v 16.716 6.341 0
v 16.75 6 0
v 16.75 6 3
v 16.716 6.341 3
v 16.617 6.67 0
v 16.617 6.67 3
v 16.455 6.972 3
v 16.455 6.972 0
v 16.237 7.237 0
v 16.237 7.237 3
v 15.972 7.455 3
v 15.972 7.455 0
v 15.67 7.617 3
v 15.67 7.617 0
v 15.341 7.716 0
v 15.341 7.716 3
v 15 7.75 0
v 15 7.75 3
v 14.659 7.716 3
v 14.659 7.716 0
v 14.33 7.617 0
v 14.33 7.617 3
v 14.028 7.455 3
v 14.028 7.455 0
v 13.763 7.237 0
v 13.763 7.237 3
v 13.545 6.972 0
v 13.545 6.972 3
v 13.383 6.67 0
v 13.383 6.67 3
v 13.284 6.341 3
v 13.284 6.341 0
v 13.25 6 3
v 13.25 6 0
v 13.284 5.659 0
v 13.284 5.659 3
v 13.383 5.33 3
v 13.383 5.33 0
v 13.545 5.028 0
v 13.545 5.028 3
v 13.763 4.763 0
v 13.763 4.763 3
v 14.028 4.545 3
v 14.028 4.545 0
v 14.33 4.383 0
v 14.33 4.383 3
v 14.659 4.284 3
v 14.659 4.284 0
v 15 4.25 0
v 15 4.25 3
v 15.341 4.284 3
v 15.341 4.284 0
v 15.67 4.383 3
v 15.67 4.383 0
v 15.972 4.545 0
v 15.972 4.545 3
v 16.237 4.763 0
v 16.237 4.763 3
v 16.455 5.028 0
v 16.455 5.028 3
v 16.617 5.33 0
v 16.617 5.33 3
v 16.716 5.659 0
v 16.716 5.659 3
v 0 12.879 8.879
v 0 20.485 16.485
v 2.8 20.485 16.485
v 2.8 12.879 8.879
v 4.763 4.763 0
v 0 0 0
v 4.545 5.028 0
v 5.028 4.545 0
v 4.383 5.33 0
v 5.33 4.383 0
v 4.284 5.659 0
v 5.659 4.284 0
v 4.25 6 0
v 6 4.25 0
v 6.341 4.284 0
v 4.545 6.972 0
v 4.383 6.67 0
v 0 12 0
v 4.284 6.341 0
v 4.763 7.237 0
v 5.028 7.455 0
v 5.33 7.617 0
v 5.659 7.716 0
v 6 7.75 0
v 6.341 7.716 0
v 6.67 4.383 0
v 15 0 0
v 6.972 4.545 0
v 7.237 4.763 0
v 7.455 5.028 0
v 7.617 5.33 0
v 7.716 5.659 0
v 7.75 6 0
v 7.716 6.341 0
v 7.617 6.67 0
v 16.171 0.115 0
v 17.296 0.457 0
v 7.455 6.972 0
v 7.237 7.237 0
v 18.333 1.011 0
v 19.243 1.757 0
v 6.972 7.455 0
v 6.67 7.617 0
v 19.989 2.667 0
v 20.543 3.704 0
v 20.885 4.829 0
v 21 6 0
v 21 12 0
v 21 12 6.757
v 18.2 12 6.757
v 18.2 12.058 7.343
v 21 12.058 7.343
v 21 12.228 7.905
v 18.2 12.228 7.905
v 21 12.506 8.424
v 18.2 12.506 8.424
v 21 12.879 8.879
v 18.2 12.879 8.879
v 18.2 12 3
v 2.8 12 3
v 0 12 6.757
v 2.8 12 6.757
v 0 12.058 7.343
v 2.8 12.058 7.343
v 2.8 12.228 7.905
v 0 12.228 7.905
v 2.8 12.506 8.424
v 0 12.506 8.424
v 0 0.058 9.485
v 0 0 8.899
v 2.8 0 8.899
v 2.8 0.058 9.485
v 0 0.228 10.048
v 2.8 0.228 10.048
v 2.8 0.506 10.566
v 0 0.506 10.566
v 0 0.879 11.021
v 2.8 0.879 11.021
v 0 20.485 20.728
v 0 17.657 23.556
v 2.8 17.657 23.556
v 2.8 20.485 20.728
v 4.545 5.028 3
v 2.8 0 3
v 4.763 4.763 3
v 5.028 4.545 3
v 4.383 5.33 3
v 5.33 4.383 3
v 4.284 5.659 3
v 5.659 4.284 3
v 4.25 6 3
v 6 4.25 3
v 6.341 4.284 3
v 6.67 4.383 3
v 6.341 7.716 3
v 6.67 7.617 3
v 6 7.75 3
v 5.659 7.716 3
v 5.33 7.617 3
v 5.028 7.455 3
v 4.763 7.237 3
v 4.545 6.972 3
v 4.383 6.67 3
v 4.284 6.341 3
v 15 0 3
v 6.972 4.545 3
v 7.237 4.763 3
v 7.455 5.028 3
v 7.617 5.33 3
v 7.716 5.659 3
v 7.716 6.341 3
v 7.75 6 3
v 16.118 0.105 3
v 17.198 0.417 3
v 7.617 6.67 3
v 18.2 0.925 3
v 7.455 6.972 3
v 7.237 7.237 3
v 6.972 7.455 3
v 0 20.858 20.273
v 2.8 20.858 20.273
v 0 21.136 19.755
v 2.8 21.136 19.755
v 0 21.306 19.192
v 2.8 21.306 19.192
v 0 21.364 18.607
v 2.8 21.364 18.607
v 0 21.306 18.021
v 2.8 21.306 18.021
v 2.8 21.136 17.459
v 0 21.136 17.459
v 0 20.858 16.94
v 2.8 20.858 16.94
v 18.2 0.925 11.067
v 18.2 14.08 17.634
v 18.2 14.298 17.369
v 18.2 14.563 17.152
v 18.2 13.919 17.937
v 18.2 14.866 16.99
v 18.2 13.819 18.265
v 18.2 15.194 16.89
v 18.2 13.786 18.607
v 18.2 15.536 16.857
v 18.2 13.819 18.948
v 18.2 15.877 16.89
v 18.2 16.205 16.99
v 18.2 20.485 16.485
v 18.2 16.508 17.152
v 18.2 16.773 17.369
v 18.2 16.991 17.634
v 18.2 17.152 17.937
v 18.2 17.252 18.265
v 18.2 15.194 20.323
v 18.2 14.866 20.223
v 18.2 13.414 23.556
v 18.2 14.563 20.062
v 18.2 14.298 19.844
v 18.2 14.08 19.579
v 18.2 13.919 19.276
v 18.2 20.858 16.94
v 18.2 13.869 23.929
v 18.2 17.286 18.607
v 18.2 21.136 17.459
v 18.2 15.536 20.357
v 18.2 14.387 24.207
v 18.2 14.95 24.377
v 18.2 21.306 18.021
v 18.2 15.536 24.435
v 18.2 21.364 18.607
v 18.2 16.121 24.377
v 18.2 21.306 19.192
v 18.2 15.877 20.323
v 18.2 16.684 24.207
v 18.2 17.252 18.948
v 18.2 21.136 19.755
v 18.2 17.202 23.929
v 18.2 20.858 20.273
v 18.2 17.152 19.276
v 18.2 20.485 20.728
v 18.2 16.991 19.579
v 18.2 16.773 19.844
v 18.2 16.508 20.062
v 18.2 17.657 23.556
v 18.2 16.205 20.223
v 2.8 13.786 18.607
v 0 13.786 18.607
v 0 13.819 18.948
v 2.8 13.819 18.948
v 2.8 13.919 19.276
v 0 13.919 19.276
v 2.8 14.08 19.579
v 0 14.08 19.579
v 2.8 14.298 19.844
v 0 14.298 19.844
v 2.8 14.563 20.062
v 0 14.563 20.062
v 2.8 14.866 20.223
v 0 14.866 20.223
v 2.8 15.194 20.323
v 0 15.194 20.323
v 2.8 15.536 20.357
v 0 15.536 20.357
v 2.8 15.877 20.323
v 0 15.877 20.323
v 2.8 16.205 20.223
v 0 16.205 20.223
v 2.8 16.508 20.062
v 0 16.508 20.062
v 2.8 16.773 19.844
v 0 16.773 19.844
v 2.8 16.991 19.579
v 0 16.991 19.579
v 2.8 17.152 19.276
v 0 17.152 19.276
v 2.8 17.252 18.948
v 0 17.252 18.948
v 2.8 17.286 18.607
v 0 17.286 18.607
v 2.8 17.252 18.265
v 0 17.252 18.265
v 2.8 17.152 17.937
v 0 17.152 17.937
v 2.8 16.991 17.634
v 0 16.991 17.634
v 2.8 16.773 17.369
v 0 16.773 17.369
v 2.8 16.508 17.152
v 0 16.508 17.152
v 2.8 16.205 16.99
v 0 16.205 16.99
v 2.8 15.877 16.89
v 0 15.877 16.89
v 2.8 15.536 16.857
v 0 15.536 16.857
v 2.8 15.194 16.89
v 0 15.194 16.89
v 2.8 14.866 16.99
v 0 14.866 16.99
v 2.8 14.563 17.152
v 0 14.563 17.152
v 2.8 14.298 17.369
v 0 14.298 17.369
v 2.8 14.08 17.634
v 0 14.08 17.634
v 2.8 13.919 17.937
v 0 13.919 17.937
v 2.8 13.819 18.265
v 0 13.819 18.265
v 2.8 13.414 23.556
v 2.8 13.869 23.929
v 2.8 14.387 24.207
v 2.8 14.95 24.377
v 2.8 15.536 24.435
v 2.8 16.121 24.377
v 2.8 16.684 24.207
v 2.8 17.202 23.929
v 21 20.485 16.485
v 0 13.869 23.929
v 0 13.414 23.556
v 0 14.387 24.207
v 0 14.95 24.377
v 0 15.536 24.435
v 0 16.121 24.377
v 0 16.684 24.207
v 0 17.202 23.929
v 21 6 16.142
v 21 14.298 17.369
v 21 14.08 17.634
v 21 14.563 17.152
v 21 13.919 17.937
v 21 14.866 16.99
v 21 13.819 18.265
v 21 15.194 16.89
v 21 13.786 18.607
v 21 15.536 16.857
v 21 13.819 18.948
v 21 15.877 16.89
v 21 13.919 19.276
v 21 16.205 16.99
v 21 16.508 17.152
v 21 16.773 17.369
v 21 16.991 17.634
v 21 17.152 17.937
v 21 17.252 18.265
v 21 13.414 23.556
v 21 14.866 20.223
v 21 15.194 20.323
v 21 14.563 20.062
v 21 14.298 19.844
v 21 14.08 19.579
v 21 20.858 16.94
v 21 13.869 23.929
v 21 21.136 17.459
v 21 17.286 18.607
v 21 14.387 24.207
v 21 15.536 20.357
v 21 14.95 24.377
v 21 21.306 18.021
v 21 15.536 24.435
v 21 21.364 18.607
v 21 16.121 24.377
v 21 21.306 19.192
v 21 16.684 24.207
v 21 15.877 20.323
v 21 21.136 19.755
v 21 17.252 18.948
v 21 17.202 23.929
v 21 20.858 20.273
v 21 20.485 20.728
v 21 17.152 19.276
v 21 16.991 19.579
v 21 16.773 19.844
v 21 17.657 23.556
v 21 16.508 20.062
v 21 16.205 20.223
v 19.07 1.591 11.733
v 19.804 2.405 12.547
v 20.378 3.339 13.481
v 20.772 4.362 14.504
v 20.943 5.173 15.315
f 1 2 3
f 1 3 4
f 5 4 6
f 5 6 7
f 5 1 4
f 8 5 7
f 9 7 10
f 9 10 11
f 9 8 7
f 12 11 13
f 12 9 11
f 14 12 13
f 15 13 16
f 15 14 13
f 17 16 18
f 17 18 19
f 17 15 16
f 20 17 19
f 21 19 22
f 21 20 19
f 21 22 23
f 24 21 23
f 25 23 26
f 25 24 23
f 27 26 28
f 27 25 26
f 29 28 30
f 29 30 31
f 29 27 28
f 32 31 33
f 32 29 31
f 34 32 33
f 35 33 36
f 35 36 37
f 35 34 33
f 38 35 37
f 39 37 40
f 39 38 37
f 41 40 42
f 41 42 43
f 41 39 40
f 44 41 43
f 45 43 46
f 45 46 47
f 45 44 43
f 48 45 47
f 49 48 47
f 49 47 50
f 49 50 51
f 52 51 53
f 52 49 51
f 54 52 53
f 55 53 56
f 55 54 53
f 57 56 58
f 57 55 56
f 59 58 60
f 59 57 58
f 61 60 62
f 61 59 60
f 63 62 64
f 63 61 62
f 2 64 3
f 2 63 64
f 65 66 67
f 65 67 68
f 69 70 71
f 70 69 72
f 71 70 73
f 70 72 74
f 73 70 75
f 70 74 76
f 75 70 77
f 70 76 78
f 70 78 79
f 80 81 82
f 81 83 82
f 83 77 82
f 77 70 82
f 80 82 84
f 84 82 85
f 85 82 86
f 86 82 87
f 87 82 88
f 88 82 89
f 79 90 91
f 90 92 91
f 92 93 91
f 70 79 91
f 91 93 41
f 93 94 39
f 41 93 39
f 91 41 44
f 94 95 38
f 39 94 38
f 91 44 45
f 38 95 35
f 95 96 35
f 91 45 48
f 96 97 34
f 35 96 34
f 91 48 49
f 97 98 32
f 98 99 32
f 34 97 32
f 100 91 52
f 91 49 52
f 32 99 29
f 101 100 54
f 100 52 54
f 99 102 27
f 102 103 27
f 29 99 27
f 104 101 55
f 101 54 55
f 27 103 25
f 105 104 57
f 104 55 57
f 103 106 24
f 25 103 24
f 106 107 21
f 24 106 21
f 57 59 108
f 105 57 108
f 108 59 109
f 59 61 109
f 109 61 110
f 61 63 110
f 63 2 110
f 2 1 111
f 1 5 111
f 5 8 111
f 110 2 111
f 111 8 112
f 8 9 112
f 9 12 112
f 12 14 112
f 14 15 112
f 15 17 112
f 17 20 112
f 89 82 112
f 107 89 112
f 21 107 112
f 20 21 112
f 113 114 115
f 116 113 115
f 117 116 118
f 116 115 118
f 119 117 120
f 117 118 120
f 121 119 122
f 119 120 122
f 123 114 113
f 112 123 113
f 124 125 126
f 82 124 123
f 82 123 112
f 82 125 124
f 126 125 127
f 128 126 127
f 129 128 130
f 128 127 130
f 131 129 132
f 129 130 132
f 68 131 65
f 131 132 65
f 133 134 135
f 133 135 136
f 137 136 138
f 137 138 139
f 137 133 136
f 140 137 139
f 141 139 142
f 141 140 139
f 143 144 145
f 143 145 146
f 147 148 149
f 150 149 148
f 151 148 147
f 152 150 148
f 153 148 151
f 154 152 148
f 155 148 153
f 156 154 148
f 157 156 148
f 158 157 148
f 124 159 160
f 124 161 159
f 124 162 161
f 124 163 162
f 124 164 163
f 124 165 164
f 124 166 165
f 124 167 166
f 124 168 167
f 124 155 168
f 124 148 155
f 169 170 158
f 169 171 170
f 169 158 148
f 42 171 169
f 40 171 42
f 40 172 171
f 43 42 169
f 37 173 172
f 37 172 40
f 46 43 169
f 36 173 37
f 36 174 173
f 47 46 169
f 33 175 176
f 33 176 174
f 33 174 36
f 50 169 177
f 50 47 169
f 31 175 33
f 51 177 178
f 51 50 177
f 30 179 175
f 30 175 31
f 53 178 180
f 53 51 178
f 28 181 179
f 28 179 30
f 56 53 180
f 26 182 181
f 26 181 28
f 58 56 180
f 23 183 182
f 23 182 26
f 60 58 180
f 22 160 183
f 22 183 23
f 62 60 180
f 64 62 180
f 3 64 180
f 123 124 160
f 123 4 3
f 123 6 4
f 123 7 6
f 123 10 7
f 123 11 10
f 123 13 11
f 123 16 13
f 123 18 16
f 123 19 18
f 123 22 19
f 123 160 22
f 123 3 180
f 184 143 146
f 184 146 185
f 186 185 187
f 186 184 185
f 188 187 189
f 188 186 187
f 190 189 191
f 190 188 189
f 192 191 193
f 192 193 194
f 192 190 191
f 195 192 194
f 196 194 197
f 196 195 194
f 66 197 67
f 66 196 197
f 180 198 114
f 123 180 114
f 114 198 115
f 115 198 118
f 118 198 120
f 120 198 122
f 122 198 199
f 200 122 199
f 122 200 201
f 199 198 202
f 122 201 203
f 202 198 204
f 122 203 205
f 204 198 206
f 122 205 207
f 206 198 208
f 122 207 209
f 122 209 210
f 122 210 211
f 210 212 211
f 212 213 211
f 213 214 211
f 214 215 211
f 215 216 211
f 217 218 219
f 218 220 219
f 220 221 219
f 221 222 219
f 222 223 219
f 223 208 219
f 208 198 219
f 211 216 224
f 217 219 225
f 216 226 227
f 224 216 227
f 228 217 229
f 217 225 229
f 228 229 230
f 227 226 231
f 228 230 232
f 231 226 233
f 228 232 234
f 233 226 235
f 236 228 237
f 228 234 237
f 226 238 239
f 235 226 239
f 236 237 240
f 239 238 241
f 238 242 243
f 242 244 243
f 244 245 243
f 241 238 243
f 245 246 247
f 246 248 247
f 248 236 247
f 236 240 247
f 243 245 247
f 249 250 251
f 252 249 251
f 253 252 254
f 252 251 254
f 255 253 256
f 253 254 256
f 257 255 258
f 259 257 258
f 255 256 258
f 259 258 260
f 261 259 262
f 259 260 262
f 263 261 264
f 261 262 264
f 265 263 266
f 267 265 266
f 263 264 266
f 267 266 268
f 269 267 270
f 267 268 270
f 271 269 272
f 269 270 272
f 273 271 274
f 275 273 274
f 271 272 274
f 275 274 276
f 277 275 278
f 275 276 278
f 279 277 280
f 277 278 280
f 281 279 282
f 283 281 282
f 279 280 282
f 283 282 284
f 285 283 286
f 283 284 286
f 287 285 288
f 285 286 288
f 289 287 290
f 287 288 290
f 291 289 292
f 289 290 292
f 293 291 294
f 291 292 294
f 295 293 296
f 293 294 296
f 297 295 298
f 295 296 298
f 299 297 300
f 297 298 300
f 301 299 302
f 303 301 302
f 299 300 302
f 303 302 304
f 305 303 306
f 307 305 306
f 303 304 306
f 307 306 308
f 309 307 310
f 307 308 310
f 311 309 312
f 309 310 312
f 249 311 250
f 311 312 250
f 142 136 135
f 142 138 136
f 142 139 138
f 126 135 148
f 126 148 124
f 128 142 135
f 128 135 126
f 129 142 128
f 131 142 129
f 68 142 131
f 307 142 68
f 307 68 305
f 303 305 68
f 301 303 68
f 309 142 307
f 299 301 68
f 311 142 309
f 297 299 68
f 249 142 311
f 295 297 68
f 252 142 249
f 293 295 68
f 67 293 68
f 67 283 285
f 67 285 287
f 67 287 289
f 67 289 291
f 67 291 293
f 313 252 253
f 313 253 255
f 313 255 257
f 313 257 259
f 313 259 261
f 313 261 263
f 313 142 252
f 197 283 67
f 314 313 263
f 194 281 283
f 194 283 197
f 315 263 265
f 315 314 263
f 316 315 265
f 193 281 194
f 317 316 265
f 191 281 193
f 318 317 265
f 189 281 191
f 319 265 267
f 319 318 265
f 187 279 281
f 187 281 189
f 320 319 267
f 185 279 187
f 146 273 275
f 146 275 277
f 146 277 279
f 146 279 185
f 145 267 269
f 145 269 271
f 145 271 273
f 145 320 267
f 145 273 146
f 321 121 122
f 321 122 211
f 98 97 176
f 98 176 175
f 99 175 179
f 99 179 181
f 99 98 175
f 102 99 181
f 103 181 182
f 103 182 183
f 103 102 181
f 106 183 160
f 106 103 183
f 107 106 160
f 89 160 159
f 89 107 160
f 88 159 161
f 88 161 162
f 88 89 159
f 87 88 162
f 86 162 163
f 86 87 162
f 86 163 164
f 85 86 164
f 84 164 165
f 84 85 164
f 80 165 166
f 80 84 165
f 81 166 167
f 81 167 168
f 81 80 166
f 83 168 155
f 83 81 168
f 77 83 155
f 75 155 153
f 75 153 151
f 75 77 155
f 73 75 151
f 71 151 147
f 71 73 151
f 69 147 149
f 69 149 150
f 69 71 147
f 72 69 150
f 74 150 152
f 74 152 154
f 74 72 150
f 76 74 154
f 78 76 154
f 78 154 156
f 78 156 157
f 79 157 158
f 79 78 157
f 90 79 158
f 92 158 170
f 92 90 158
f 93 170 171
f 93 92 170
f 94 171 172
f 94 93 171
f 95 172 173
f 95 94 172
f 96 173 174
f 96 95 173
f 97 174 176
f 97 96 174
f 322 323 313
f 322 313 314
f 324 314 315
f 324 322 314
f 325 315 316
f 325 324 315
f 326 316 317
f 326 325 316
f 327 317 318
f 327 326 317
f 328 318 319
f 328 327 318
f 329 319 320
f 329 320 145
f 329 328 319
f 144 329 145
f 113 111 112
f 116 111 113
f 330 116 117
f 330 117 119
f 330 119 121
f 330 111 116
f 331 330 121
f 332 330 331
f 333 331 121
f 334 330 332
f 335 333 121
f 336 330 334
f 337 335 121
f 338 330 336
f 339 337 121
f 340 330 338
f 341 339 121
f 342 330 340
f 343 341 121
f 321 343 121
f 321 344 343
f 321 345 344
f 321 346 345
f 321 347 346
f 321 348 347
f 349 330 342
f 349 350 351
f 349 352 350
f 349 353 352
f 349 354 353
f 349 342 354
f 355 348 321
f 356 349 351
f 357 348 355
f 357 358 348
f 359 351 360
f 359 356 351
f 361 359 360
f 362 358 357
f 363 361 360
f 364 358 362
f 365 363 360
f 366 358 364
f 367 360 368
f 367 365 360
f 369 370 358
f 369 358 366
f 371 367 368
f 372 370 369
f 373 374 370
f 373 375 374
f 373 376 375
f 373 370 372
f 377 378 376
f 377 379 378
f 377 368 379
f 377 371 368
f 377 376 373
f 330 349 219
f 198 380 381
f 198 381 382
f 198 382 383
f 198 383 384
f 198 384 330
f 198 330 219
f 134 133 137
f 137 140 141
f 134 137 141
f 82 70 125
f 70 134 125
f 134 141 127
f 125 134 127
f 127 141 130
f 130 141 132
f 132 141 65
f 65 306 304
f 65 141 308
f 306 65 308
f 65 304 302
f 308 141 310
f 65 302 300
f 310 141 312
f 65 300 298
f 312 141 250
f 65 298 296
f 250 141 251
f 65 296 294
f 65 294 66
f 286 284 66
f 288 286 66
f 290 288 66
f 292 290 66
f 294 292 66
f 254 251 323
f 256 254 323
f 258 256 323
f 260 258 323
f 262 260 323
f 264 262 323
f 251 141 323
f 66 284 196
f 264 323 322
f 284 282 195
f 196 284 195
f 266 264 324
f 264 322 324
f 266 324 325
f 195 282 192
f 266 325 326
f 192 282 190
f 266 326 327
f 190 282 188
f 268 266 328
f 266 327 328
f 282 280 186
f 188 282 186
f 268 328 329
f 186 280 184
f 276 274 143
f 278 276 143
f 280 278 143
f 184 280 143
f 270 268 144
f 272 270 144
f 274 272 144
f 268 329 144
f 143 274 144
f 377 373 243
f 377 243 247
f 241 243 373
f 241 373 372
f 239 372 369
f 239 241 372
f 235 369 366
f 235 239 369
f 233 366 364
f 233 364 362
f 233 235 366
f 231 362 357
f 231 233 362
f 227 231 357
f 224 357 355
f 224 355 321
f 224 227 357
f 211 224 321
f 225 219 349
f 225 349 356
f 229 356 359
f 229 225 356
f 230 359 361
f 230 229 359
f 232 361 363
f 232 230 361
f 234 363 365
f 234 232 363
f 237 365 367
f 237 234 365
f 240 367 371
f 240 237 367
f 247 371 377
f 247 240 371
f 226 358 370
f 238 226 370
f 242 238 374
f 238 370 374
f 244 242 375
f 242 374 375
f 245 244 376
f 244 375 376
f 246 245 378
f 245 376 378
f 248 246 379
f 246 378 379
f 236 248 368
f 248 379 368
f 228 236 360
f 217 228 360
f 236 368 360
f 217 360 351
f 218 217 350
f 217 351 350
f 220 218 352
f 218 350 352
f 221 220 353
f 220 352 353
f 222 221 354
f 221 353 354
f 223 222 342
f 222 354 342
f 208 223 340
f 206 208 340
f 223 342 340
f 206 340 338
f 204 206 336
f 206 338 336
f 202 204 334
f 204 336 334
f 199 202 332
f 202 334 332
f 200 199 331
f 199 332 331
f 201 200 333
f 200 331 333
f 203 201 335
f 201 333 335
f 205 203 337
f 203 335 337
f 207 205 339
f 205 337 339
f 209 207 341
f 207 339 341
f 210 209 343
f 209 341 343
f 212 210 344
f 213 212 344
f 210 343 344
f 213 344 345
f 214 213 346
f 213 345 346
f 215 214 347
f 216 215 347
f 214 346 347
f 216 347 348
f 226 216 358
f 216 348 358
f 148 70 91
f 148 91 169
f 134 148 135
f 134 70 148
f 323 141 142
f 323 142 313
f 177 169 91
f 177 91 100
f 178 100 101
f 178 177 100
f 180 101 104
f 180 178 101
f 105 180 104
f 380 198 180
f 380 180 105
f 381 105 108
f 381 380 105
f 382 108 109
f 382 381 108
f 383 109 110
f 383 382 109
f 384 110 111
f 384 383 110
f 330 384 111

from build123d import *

# Parameters (mm, degrees)
F0_W        = 21
F0_H        = 12
F0_R        = 1.75
F1_DEPTH    = 3
F3_R        = 1.75
F4_DEPTH    = 2.8
F2_R        = 1.75
F5_DEPTH    = 2.8
F6_R        = 6
F7_T1_DEPTH = 2.8
F7_T3_DEPTH = 2.8
F7_T5_DEPTH = 17.8
F7_T7_DEPTH = 17.8
F7_T9_DEPTH = 9.0132034356


# Not quite as in the source:
# - a fillet or chamfer that OpenCascade refuses, or shapes differently, is made with other operations: its cross-section is extruded or revolved along the edge and cut away or added


with BuildPart() as f1:
    # F0 (on Top) → F1 (new body)
    with BuildSketch(Plane.XY):
        with Locations((10.5, 6)):
            Rectangle(F0_W, F0_H)
        with Locations((6, 6)):
            Circle(F0_R, mode=Mode.SUBTRACT)
        with Locations((15, 6)):
            Circle(F0_R, mode=Mode.SUBTRACT)
    extrude(amount=F1_DEPTH)

    # F3 (on face) → F4 (join)
    with BuildSketch(Plane.YZ.offset(21)):
        Polygon((0, 10.1421356237), (0, 3), (12, 3), (12, 8), (22.6066017178, 18.6066017178), (15.5355339059, 25.6776695297), align=None)
        with Locations((15.5355339059, 18.6066017178)):
            Circle(F3_R, mode=Mode.SUBTRACT)
    extrude(amount=-F4_DEPTH)

    # F2 (on face) → F5 (join)
    with BuildSketch(Plane(origin=(0, 0, 0), x_dir=(0, -1, 0), z_dir=(-1, 0, 0))):
        Polygon((-12, 8), (-12, 3), (0, 3), (0, 10.1421356237), (-15.5355339059, 25.6776695297), (-22.6066017178, 18.6066017178), align=None)
        with Locations((-15.5355339059, 18.6066017178)):
            Circle(F2_R, mode=Mode.SUBTRACT)
    extrude(amount=-F5_DEPTH)

    # F6
    f6_edges = [f1.edges().sort_by_distance(p)[0] for p in [
        (21, 0, 5.071068),
    ]]
    fillet(f6_edges, radius=F6_R)

    # F7: fillet of radius 3 on 8 edges, made by hand

    # F7_s2 → F7_t1 (join)
    with BuildSketch(Plane.YZ.offset(18.2)):
        with BuildLine():
            ThreePointArc((12, 6.7573593129), (12.2283614025, 7.90540961), (12.8786796564, 8.8786796564))
            Line((12.8786796564, 8.8786796564), (12, 8))
            Line((12, 8), (12, 6.7573593129))
        make_face()
    extrude(amount=F7_T1_DEPTH)

    # F7_s4 → F7_t3 (join)
    with BuildSketch(Plane.YZ):
        with BuildLine():
            ThreePointArc((12, 6.7573593129), (12.2283614025, 7.90540961), (12.8786796564, 8.8786796564))
            Line((12.8786796564, 8.8786796564), (12, 8))
            Line((12, 8), (12, 6.7573593129))
        make_face()
    extrude(amount=F7_T3_DEPTH)

    # F7_s6 → F7_t5 (cut)
    with BuildSketch(Plane.YZ.offset(-7.5)):
        with BuildLine():
            ThreePointArc((20.4852813742, 20.7279220614), (21.3639610307, 18.6066017178), (20.4852813742, 16.4852813742))
            Line((20.4852813742, 16.4852813742), (22.6066017178, 18.6066017178))
            Line((22.6066017178, 18.6066017178), (20.4852813742, 20.7279220614))
        make_face()
        with BuildLine():
            ThreePointArc((13.4142135624, 23.5563491861), (15.5355339059, 24.4350288425), (17.6568542495, 23.5563491861))
            Line((17.6568542495, 23.5563491861), (15.5355339059, 25.6776695297))
            Line((15.5355339059, 25.6776695297), (13.4142135624, 23.5563491861))
        make_face()
    extrude(amount=F7_T5_DEPTH, mode=Mode.SUBTRACT)

    # F7_s8 → F7_t7 (cut)
    with BuildSketch(Plane.YZ.offset(10.7)):
        with BuildLine():
            ThreePointArc((20.4852813742, 20.7279220614), (21.3639610307, 18.6066017178), (20.4852813742, 16.4852813742))
            Line((20.4852813742, 16.4852813742), (22.6066017178, 18.6066017178))
            Line((22.6066017178, 18.6066017178), (20.4852813742, 20.7279220614))
        make_face()
        with BuildLine():
            ThreePointArc((13.4142135624, 23.5563491861), (15.5355339059, 24.4350288425), (17.6568542495, 23.5563491861))
            Line((17.6568542495, 23.5563491861), (15.5355339059, 25.6776695297))
            Line((15.5355339059, 25.6776695297), (13.4142135624, 23.5563491861))
        make_face()
    extrude(amount=F7_T7_DEPTH, mode=Mode.SUBTRACT)

    # F7_s10 → F7_t9 (cut)
    with BuildSketch(Plane.YZ.offset(-3.1066017178)):
        with BuildLine():
            ThreePointArc((0, 8.8994949366), (0.2283614025, 10.0475452337), (0.8786796564, 11.0208152802))
            Line((0.8786796564, 11.0208152802), (0, 10.1421356237))
            Line((0, 10.1421356237), (0, 8.8994949366))
        make_face()
    extrude(amount=F7_T9_DEPTH, mode=Mode.SUBTRACT)


solid = f1.part
